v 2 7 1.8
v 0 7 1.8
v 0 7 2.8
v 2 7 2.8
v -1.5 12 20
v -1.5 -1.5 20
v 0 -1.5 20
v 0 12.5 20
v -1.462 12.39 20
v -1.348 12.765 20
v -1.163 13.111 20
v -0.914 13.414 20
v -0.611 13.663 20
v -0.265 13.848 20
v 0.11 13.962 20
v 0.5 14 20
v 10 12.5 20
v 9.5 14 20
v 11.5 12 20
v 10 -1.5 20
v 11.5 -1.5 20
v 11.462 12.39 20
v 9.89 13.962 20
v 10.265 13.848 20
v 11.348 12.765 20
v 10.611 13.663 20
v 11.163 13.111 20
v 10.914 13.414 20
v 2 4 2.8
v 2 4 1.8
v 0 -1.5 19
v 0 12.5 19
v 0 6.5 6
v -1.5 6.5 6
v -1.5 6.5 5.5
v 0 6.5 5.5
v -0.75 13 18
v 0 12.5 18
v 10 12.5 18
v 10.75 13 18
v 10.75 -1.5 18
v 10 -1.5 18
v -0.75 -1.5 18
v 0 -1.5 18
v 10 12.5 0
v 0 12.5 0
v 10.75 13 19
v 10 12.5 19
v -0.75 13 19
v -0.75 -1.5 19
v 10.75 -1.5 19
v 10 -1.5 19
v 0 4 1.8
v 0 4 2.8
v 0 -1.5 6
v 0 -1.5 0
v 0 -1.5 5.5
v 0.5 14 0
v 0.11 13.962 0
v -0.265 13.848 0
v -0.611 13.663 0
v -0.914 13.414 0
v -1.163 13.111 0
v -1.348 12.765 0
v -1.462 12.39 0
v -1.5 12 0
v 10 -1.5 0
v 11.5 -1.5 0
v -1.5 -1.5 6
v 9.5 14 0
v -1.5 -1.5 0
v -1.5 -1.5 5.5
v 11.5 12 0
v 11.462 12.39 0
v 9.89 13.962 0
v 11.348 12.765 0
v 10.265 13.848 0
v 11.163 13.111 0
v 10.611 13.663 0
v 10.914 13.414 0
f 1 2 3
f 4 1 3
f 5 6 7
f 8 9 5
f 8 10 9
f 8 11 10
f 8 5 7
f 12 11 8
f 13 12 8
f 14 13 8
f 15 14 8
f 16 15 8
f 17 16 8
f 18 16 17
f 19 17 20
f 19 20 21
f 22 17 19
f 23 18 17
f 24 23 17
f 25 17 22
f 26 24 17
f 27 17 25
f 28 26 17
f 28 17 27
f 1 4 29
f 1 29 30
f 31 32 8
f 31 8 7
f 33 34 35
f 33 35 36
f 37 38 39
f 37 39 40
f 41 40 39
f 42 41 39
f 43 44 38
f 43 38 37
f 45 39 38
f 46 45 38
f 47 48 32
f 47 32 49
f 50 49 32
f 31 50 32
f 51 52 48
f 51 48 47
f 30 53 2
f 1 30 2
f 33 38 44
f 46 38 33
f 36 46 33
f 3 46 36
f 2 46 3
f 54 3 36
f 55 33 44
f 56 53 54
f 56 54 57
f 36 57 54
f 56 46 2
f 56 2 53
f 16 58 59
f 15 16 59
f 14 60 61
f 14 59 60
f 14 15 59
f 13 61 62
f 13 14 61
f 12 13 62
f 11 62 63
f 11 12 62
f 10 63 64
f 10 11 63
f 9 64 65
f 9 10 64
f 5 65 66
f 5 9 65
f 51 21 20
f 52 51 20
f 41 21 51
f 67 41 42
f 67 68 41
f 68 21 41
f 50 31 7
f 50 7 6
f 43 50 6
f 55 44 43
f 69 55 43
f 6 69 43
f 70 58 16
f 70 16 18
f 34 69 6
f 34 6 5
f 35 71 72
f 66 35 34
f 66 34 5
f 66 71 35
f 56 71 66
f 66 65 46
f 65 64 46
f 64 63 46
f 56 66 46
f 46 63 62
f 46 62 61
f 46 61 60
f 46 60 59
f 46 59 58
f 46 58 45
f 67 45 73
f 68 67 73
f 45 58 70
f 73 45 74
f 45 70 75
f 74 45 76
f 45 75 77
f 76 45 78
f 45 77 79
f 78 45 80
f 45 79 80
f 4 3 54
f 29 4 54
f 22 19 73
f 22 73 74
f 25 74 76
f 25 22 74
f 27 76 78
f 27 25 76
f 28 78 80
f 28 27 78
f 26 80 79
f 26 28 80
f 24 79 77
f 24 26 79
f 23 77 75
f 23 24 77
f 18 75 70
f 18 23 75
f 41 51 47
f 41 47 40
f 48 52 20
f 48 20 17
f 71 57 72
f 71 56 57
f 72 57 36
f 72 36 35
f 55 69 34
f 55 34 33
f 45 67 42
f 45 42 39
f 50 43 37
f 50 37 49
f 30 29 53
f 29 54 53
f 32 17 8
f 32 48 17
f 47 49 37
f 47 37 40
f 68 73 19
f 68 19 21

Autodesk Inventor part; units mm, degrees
ref_plane "YZ Plane" through (0, 0, 0) normal (1, 0, 0) x (0, 1, 0)
ref_plane "XZ Plane" through (0, 0, 0) normal (0, 1, 0) x (-1, 0, 0)
ref_plane "XY Plane" through (0, 0, 0) normal (0, 0, 1) x (1, 0, 0)
sketch "스케치1" plane through (0, 0, 0) normal (0, 0, 1) x (1, 0, 0)
  line L0 (0, 0) -> (10, 0)
  line L1 (10, 0) -> (10, 12.5)
  line L2 (10, 12.5) -> (0, 12.5)
  line L3 (0, 12.5) -> (0, 0)
  line L4 (-1.5, 14) -> (11.5, 14)
  line L5 (11.5, 14) -> (11.5, -1.5)
  line L6 (11.5, -1.5) -> (-1.5, -1.5)
  line L7 (-1.5, -1.5) -> (-1.5, 14)
  line L8 (0, 0) -> (0, -1.5)
  line L9 (10, 0) -> (10, -1.5)
  line L10 (0, 0) -> (-1.5, 0)
  line L11 (10, 0) -> (11.5, 0)
  dimension "d0" = 10
  dimension "d1" = 12.5
  dimension "d2" = 1.5
extrude "돌출1" add sketch "스케치1" along normal blind 20 contours L10 L7 L4 L5 L11 L1 L2 L3 | L8 L6 L7 L10 | L11 L5 L6 L9
sketch "스케치2" plane through (-1.5, -1.5, 0) normal (0, -1, 0) x (1, 0, 0)
  line L0 (0, 0) -> (1.5, 0) projected
  line L1 (1.5, 0) -> (1.5, 20) projected
  line L2 (0, 20) -> (1.5, 20) projected
  line L3 (0, 0) -> (0, 20) projected
  line L4 (1.5, 5.5) -> (0, 5.5)
  line L5 (0, 5.5) -> (0, 6)
  line L6 (0, 6) -> (1.5, 6)
  line L7 (1.5, 6) -> (1.5, 5.5)
  point P0 (1.5, 0)
  point P1 (1.5, 6)
  point P2 (0, 5.5)
  dimension "d5" = 0.5
  dimension "d6" = 5.5
extrude "돌출2" cut sketch "스케치2" against normal blind 8 contours L3 L6 L1 L4
fillet "모깎기1" radius 2 2 edges at (-1.5, 14, 10) (11.5, 14, 10)
sketch "스케치3" plane through (10, -1.5, 0) normal (0, -1, 0) x (1, 0, 0)
  line L0 (-10.75, 19) -> (0.75, 19)
  line L1 (0.75, 19) -> (0.75, 18)
  line L2 (0.75, 18) -> (-10.75, 18)
  line L3 (-10.75, 18) -> (-10.75, 19)
  line L4 (-11.5, 6) -> (-10, 6) projected
  line L5 (-10, 6) -> (-10, 20) projected
  line L6 (-11.5, 20) -> (-10, 20) projected
  line L7 (-11.5, 6) -> (-11.5, 20) projected
  line L8 (0, 0) -> (1.5, 0) projected
  line L9 (1.5, 0) -> (1.5, 20) projected
  line L10 (0, 20) -> (1.5, 20) projected
  line L11 (0, 0) -> (0, 20) projected
  point P0 (-10, 0)
  point P1 (-10.75, 20)
  point P2 (-10.75, 18.5)
  point P3 (0.75, 20)
  point P4 (0.75, 18.5)
  dimension "d10" = 1
  dimension "d11" = 1
extrude "돌출3" cut sketch "스케치3" against normal blind 14.5 contours L0 L5 L2 L3 | L0 L11 L2 L5 | L0 L1 L2 L11
sketch "스케치4" plane through (0, -1.5, 0) normal (1, 0, 0) x (0, 0, -1)
  line L0 (-2.8, 5.5) -> (-1.8, 5.5)
  line L1 (-1.8, 5.5) -> (-1.8, 8.5)
  line L2 (-1.8, 8.5) -> (-2.8, 8.5)
  line L3 (-2.8, 8.5) -> (-2.8, 5.5)
  line L4 (0, 0) -> (-5.5, 0) projected
  line L5 (0, 13.5) -> (0, 0) projected
  point P0 (0, 1.5)
  point P1 (-2.8, 7)
  dimension "d14" = 1
  dimension "d15" = 3
  dimension "d16" = 7
  dimension "d20" = 2.8
extrude "돌출4" add sketch "스케치4" along normal blind 2
properties part number "_3D 인쇄"
